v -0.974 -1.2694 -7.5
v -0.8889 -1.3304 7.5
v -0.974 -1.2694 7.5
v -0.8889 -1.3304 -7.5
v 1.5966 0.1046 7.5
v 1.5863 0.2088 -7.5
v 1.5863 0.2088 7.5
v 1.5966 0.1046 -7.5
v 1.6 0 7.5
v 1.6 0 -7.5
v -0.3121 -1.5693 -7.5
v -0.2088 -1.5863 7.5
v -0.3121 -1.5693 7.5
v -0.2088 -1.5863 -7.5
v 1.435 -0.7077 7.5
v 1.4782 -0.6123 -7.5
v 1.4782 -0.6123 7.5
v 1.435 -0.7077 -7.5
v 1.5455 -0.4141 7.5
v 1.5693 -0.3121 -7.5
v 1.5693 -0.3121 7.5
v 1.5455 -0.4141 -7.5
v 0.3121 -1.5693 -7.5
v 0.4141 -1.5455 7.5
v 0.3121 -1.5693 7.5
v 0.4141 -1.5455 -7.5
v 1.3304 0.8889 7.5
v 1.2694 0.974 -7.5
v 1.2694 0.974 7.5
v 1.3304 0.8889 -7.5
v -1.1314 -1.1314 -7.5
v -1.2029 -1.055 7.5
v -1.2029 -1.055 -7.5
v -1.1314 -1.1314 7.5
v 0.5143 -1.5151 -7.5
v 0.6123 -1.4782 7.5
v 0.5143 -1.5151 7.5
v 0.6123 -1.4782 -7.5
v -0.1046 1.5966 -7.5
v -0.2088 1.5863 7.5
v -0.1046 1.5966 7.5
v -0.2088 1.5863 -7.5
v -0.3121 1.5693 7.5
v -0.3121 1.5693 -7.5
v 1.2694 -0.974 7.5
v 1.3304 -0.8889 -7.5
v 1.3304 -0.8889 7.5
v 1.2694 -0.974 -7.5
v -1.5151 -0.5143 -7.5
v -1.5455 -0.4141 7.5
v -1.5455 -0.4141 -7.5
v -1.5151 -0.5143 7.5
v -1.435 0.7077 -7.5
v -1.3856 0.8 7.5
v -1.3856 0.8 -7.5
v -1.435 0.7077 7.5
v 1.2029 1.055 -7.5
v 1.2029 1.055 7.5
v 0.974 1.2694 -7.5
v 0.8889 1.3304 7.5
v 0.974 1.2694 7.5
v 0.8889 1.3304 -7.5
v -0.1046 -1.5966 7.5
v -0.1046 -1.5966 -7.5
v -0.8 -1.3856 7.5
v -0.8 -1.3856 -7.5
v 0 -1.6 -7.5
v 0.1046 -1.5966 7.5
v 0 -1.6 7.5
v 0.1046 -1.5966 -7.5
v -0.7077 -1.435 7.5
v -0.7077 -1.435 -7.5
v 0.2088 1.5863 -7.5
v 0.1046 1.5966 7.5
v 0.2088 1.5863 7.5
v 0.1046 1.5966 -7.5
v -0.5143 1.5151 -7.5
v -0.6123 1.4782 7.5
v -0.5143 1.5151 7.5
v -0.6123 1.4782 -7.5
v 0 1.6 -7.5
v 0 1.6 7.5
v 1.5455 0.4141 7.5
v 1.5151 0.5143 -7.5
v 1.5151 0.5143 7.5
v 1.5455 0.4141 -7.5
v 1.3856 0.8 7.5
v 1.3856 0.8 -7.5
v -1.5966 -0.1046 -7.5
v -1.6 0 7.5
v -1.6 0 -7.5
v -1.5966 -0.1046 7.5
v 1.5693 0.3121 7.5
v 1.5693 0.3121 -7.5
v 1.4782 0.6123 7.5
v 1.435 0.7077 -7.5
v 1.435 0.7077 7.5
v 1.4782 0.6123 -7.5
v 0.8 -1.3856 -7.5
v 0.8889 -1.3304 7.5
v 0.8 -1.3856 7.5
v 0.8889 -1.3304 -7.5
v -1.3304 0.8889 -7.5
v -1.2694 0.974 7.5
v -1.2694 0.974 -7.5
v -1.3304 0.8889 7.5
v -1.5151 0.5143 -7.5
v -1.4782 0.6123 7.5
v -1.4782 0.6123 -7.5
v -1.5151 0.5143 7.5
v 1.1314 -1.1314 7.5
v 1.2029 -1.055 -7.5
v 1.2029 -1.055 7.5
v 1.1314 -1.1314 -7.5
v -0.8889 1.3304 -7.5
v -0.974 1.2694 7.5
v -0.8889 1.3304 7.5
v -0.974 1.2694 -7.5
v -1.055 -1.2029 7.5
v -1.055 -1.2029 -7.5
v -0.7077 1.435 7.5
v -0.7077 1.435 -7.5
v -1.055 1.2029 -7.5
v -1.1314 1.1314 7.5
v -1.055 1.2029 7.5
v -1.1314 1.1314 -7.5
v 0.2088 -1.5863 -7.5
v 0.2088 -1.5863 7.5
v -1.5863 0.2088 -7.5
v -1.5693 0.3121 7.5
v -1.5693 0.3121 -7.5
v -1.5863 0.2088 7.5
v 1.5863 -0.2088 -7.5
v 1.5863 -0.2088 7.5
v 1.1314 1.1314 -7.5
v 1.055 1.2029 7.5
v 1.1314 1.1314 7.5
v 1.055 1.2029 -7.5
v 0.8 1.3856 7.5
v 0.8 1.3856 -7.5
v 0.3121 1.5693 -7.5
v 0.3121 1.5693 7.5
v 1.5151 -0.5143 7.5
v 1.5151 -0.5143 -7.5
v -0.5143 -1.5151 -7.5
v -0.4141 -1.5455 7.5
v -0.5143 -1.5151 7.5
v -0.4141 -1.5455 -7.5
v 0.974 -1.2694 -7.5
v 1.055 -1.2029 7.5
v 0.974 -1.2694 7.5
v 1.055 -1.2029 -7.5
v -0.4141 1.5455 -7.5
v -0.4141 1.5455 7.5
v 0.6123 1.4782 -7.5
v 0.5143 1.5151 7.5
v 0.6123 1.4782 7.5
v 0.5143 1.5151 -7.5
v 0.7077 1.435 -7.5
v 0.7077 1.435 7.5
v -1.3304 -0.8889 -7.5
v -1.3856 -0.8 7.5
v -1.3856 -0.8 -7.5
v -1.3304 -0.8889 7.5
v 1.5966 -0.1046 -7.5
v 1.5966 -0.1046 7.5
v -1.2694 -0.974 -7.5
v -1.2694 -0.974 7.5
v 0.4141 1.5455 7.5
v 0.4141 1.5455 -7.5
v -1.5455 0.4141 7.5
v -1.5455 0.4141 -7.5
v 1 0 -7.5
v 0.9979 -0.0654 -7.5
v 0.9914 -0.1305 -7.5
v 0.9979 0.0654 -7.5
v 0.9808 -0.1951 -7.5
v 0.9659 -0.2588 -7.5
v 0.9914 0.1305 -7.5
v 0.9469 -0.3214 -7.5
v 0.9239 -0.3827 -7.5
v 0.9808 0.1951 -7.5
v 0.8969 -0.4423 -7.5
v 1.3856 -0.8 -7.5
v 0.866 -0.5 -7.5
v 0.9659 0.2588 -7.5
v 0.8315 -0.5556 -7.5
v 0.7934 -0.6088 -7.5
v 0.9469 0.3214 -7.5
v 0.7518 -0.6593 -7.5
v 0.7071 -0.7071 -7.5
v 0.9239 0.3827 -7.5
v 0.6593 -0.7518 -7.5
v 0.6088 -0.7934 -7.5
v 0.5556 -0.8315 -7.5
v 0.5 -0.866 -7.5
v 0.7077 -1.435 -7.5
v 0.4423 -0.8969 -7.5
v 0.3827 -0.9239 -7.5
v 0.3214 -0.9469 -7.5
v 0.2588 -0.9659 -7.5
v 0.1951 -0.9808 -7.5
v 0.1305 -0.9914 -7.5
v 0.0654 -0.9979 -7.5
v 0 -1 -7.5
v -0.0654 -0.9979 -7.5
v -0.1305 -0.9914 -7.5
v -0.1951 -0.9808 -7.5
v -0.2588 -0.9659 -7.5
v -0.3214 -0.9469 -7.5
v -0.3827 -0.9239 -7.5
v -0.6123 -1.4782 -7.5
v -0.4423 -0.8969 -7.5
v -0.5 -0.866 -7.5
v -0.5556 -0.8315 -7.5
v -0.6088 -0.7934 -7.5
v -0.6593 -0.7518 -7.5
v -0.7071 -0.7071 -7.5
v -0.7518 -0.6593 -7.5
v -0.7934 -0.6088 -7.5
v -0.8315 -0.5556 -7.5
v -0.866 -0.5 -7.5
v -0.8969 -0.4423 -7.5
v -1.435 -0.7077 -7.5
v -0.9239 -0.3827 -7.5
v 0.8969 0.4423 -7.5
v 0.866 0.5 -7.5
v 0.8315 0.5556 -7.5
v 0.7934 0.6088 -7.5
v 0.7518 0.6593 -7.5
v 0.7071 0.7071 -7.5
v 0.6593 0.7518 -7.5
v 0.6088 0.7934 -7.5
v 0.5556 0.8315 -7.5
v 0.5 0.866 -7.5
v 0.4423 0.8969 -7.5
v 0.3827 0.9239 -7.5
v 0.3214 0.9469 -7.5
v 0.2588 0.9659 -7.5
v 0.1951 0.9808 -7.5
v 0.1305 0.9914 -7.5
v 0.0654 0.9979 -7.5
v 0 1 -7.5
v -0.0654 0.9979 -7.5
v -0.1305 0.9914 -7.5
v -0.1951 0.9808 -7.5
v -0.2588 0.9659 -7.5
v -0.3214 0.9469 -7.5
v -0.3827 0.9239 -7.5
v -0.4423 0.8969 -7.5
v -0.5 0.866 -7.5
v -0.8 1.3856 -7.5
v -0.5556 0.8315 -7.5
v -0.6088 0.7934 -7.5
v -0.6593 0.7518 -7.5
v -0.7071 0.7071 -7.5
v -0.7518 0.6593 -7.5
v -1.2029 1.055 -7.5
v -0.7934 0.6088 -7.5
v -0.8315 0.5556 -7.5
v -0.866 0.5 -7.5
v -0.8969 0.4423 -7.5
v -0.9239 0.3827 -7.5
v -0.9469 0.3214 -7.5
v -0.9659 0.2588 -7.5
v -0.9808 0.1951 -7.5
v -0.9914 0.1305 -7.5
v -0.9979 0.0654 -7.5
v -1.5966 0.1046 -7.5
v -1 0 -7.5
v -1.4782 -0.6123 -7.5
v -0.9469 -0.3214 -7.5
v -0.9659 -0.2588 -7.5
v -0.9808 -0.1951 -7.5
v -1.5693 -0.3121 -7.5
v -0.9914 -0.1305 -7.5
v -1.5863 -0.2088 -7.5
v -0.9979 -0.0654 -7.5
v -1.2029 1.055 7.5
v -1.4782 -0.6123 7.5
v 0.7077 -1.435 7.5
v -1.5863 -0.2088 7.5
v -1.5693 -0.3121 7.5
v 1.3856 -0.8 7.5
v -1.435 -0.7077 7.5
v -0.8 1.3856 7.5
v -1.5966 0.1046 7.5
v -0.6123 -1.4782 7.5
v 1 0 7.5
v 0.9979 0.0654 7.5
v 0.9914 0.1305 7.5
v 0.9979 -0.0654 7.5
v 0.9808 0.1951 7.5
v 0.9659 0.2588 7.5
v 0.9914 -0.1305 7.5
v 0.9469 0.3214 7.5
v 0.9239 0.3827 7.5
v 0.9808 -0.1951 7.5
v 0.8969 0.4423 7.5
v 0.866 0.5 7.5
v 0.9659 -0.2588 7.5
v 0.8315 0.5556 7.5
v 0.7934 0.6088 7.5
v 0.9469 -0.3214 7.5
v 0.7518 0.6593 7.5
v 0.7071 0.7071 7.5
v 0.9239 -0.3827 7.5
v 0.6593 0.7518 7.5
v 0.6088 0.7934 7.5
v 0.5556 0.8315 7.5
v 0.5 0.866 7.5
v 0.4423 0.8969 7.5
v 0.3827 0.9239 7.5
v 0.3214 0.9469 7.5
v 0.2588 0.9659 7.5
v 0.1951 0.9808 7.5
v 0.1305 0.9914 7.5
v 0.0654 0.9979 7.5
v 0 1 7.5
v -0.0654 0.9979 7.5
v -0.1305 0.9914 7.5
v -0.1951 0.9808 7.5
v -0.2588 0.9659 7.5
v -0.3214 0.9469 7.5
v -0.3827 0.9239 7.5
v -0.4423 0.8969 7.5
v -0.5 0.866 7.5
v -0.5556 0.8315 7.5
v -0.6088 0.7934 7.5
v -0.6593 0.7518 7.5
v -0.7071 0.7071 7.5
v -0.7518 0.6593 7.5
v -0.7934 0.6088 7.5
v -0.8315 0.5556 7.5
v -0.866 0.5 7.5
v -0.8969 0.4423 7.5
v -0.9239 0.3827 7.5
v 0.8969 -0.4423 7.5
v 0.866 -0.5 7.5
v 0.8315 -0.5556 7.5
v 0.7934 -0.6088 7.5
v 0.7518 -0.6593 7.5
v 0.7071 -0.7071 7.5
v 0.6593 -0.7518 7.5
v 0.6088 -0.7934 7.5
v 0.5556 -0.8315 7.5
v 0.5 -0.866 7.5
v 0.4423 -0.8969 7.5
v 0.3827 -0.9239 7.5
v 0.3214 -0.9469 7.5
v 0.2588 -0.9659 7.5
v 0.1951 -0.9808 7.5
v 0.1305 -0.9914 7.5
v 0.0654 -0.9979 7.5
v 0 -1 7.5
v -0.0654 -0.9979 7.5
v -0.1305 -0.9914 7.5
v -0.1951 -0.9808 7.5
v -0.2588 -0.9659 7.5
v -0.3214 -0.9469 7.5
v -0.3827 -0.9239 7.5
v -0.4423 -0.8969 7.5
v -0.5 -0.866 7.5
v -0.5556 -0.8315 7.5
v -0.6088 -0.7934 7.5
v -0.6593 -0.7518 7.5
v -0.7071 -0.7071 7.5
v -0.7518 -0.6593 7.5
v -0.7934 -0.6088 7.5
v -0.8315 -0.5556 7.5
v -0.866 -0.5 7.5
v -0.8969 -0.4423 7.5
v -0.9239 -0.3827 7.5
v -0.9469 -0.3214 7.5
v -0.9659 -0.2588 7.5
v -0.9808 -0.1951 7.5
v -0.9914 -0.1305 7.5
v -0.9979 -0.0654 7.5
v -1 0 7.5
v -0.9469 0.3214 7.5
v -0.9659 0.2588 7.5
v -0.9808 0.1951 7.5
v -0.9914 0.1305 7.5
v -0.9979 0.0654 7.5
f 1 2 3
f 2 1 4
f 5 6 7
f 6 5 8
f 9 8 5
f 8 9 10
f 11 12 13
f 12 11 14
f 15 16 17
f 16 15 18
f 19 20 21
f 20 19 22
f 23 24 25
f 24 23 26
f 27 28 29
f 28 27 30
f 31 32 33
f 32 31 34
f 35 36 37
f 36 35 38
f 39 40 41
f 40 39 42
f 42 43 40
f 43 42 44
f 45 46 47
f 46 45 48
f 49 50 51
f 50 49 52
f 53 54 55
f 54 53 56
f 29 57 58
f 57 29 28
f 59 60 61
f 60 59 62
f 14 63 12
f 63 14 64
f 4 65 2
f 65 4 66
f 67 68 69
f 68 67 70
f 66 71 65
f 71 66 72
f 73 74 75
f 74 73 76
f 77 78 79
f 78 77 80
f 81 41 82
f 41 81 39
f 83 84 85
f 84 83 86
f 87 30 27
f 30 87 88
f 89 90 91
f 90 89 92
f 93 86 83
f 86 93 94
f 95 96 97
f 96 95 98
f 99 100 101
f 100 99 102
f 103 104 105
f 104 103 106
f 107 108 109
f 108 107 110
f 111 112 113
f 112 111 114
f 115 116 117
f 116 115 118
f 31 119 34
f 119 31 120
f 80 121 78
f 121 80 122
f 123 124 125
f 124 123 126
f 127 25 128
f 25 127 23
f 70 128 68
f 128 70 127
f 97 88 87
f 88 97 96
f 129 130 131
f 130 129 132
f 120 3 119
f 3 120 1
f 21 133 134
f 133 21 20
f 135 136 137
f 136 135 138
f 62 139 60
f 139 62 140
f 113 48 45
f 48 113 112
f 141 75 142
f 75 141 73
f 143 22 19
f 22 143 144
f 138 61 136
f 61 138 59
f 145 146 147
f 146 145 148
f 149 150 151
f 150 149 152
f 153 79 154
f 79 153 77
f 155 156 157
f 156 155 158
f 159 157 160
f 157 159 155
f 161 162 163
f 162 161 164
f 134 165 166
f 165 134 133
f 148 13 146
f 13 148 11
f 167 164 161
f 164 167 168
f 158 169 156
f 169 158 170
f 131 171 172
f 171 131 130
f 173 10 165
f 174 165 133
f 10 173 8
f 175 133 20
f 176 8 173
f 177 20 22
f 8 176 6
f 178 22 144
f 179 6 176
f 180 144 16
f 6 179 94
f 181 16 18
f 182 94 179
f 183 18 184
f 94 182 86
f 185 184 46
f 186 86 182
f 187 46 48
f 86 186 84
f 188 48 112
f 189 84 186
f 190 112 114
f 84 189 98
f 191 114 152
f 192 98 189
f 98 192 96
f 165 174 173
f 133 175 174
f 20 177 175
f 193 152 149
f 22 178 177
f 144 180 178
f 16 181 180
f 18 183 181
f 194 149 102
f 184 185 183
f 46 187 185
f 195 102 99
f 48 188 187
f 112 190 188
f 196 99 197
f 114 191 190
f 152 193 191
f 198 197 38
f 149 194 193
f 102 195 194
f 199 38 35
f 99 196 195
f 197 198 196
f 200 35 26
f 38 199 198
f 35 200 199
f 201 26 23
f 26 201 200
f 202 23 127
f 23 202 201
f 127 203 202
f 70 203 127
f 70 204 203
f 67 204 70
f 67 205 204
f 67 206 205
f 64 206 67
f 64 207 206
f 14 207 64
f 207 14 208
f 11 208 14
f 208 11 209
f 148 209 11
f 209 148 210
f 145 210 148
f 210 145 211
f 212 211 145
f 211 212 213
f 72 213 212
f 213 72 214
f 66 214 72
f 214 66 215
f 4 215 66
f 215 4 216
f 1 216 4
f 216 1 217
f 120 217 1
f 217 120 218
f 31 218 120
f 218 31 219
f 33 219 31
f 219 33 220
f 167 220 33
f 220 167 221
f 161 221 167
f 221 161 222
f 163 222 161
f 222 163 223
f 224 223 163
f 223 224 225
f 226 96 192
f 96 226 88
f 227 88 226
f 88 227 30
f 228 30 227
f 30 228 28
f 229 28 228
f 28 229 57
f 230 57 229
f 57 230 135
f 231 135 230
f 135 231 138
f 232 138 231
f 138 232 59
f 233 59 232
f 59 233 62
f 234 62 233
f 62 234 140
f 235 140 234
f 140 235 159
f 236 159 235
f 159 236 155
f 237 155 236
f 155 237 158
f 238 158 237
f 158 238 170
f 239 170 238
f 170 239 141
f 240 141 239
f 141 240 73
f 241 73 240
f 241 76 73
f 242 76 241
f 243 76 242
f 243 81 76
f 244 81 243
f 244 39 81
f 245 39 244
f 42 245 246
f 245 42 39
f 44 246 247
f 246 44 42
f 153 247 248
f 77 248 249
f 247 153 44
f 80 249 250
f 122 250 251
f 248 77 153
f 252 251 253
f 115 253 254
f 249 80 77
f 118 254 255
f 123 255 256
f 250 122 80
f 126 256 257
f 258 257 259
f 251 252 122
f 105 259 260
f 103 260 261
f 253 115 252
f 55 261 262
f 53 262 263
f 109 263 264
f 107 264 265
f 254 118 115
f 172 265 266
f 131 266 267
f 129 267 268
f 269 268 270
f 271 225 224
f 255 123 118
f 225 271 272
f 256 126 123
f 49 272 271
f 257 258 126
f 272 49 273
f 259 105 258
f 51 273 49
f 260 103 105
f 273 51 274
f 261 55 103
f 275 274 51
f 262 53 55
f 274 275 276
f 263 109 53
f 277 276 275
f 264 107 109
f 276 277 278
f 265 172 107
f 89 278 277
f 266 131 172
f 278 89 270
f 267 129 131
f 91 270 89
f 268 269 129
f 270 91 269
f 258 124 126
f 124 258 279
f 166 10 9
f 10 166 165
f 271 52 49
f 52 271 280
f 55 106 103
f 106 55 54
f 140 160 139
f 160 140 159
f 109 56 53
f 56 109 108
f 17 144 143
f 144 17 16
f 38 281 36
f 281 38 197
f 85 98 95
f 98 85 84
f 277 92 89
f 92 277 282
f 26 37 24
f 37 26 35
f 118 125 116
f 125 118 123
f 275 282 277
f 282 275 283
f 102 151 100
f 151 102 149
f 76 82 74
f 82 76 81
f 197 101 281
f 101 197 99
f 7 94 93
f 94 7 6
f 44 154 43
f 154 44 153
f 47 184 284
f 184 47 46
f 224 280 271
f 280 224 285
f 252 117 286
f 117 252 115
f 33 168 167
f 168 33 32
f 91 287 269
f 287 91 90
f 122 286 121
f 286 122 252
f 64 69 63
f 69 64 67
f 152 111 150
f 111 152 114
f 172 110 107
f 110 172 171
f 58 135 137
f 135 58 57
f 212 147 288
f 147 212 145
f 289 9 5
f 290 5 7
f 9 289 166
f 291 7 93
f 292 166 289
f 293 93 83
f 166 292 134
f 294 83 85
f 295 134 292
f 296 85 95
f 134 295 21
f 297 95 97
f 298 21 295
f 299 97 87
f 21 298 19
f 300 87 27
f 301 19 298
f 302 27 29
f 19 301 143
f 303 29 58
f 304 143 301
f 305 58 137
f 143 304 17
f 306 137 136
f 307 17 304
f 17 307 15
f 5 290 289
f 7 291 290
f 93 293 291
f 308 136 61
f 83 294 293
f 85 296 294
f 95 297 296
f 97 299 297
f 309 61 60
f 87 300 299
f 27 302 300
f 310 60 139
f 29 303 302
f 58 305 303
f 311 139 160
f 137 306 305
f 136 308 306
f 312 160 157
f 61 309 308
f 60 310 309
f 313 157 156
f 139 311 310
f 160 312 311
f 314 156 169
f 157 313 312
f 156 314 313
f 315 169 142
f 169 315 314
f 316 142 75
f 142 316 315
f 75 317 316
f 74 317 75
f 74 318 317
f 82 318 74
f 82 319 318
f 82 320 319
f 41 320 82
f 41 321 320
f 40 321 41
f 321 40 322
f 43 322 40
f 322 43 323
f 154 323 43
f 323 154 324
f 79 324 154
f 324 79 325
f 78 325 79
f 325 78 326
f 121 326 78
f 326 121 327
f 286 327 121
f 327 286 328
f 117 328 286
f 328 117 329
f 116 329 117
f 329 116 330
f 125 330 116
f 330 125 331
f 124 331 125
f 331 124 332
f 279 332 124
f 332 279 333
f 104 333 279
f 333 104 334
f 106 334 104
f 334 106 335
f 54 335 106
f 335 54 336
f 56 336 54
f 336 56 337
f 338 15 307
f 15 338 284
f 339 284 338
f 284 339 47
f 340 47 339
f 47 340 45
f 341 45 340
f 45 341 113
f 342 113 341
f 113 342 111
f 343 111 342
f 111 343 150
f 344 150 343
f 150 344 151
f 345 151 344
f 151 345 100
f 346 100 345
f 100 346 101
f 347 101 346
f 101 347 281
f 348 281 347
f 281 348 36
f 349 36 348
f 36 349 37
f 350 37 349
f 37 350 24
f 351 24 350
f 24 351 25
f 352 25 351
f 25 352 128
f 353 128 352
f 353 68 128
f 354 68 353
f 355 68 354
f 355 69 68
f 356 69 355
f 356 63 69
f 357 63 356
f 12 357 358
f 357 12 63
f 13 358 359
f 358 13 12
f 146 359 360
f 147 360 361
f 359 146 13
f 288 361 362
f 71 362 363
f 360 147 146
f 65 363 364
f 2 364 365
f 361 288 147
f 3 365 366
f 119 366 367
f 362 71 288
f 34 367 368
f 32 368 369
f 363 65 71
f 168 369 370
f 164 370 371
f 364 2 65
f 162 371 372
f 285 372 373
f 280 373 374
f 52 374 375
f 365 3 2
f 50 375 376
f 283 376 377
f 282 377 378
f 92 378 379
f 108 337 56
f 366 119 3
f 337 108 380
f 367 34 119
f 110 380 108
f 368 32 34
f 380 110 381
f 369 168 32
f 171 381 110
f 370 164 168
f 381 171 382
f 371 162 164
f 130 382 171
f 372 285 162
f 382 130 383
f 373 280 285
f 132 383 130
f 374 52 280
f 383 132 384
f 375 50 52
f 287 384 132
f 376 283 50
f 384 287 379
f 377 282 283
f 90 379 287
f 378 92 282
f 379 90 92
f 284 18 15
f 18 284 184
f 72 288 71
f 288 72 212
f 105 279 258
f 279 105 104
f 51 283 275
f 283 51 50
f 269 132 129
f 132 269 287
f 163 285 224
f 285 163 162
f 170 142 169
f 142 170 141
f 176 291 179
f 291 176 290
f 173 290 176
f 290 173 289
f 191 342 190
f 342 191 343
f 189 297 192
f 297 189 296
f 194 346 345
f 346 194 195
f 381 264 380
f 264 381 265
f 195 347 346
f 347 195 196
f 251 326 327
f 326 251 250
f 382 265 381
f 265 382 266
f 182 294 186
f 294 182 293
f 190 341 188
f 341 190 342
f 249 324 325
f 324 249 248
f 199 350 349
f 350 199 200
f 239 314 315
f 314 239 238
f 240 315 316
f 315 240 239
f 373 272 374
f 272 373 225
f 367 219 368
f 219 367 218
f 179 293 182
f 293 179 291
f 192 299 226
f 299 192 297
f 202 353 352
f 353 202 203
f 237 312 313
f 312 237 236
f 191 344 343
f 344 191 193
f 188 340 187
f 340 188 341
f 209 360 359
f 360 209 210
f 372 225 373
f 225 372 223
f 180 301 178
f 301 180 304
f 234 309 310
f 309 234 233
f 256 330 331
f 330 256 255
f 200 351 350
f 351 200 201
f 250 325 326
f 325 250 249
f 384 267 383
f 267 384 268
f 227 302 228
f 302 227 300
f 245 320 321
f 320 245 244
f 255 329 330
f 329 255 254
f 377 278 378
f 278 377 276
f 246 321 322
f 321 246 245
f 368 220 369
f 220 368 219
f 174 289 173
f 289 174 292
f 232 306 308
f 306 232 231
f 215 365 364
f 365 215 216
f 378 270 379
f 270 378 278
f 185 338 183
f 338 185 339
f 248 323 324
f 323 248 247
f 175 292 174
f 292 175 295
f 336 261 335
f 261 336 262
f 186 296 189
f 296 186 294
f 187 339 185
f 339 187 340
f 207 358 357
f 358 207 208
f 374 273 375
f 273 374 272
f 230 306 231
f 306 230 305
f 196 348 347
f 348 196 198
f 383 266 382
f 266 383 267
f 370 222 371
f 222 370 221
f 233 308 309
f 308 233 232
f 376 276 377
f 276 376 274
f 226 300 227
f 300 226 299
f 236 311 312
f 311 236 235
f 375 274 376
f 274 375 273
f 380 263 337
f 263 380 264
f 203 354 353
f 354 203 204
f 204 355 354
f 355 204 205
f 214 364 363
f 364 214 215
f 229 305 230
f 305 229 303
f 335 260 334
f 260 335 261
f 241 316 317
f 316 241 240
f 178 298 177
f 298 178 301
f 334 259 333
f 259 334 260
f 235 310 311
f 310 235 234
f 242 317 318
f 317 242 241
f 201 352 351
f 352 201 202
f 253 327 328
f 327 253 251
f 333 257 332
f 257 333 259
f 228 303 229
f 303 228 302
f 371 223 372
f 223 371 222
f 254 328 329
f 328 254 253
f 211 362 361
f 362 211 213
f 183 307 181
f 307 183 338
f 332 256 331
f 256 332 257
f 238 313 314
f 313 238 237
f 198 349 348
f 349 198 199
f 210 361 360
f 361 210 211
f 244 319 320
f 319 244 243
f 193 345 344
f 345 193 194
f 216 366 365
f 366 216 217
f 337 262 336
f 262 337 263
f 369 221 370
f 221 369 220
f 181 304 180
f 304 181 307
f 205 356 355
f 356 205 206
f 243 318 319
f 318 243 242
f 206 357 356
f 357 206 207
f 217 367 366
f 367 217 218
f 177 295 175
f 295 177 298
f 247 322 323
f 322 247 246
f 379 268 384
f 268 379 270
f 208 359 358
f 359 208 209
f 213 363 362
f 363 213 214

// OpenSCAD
// PTFE heatshrink sleeving (simple hollow tube) - single connected solid

// Parameters
length = 15; //[8:30:1]
forced_id = 0; //[0:10:0.5]
center = true; //[0:1:1]
original_od = 3.2; //[1.6:6.4:0.1]
original_id = 2.0; //[1.0:4.0:0.1]
eps_overlap = 0.8; //[0.5:2:0.1]

$fn = 96;

// Derived dimensions
id = (forced_id > 0) ? forced_id : original_id;
od = original_od + ((forced_id > 0) ? (forced_id - original_id) : 0);

// Safety clamps to avoid invalid/blank geometry
min_wall = 0.2;
od_safe = max(od, id + 2*min_wall);
id_safe = min(id, od_safe - 2*min_wall);

module ptfe_heatshrink_sleeve() {
  color([0.85, 0.85, 0.8])
  difference() {
    cylinder(h=length, r=od_safe/2, center=center);
    cylinder(h=length + 2*eps_overlap, r=id_safe/2, center=center);
  }
}

ptfe_heatshrink_sleeve();
